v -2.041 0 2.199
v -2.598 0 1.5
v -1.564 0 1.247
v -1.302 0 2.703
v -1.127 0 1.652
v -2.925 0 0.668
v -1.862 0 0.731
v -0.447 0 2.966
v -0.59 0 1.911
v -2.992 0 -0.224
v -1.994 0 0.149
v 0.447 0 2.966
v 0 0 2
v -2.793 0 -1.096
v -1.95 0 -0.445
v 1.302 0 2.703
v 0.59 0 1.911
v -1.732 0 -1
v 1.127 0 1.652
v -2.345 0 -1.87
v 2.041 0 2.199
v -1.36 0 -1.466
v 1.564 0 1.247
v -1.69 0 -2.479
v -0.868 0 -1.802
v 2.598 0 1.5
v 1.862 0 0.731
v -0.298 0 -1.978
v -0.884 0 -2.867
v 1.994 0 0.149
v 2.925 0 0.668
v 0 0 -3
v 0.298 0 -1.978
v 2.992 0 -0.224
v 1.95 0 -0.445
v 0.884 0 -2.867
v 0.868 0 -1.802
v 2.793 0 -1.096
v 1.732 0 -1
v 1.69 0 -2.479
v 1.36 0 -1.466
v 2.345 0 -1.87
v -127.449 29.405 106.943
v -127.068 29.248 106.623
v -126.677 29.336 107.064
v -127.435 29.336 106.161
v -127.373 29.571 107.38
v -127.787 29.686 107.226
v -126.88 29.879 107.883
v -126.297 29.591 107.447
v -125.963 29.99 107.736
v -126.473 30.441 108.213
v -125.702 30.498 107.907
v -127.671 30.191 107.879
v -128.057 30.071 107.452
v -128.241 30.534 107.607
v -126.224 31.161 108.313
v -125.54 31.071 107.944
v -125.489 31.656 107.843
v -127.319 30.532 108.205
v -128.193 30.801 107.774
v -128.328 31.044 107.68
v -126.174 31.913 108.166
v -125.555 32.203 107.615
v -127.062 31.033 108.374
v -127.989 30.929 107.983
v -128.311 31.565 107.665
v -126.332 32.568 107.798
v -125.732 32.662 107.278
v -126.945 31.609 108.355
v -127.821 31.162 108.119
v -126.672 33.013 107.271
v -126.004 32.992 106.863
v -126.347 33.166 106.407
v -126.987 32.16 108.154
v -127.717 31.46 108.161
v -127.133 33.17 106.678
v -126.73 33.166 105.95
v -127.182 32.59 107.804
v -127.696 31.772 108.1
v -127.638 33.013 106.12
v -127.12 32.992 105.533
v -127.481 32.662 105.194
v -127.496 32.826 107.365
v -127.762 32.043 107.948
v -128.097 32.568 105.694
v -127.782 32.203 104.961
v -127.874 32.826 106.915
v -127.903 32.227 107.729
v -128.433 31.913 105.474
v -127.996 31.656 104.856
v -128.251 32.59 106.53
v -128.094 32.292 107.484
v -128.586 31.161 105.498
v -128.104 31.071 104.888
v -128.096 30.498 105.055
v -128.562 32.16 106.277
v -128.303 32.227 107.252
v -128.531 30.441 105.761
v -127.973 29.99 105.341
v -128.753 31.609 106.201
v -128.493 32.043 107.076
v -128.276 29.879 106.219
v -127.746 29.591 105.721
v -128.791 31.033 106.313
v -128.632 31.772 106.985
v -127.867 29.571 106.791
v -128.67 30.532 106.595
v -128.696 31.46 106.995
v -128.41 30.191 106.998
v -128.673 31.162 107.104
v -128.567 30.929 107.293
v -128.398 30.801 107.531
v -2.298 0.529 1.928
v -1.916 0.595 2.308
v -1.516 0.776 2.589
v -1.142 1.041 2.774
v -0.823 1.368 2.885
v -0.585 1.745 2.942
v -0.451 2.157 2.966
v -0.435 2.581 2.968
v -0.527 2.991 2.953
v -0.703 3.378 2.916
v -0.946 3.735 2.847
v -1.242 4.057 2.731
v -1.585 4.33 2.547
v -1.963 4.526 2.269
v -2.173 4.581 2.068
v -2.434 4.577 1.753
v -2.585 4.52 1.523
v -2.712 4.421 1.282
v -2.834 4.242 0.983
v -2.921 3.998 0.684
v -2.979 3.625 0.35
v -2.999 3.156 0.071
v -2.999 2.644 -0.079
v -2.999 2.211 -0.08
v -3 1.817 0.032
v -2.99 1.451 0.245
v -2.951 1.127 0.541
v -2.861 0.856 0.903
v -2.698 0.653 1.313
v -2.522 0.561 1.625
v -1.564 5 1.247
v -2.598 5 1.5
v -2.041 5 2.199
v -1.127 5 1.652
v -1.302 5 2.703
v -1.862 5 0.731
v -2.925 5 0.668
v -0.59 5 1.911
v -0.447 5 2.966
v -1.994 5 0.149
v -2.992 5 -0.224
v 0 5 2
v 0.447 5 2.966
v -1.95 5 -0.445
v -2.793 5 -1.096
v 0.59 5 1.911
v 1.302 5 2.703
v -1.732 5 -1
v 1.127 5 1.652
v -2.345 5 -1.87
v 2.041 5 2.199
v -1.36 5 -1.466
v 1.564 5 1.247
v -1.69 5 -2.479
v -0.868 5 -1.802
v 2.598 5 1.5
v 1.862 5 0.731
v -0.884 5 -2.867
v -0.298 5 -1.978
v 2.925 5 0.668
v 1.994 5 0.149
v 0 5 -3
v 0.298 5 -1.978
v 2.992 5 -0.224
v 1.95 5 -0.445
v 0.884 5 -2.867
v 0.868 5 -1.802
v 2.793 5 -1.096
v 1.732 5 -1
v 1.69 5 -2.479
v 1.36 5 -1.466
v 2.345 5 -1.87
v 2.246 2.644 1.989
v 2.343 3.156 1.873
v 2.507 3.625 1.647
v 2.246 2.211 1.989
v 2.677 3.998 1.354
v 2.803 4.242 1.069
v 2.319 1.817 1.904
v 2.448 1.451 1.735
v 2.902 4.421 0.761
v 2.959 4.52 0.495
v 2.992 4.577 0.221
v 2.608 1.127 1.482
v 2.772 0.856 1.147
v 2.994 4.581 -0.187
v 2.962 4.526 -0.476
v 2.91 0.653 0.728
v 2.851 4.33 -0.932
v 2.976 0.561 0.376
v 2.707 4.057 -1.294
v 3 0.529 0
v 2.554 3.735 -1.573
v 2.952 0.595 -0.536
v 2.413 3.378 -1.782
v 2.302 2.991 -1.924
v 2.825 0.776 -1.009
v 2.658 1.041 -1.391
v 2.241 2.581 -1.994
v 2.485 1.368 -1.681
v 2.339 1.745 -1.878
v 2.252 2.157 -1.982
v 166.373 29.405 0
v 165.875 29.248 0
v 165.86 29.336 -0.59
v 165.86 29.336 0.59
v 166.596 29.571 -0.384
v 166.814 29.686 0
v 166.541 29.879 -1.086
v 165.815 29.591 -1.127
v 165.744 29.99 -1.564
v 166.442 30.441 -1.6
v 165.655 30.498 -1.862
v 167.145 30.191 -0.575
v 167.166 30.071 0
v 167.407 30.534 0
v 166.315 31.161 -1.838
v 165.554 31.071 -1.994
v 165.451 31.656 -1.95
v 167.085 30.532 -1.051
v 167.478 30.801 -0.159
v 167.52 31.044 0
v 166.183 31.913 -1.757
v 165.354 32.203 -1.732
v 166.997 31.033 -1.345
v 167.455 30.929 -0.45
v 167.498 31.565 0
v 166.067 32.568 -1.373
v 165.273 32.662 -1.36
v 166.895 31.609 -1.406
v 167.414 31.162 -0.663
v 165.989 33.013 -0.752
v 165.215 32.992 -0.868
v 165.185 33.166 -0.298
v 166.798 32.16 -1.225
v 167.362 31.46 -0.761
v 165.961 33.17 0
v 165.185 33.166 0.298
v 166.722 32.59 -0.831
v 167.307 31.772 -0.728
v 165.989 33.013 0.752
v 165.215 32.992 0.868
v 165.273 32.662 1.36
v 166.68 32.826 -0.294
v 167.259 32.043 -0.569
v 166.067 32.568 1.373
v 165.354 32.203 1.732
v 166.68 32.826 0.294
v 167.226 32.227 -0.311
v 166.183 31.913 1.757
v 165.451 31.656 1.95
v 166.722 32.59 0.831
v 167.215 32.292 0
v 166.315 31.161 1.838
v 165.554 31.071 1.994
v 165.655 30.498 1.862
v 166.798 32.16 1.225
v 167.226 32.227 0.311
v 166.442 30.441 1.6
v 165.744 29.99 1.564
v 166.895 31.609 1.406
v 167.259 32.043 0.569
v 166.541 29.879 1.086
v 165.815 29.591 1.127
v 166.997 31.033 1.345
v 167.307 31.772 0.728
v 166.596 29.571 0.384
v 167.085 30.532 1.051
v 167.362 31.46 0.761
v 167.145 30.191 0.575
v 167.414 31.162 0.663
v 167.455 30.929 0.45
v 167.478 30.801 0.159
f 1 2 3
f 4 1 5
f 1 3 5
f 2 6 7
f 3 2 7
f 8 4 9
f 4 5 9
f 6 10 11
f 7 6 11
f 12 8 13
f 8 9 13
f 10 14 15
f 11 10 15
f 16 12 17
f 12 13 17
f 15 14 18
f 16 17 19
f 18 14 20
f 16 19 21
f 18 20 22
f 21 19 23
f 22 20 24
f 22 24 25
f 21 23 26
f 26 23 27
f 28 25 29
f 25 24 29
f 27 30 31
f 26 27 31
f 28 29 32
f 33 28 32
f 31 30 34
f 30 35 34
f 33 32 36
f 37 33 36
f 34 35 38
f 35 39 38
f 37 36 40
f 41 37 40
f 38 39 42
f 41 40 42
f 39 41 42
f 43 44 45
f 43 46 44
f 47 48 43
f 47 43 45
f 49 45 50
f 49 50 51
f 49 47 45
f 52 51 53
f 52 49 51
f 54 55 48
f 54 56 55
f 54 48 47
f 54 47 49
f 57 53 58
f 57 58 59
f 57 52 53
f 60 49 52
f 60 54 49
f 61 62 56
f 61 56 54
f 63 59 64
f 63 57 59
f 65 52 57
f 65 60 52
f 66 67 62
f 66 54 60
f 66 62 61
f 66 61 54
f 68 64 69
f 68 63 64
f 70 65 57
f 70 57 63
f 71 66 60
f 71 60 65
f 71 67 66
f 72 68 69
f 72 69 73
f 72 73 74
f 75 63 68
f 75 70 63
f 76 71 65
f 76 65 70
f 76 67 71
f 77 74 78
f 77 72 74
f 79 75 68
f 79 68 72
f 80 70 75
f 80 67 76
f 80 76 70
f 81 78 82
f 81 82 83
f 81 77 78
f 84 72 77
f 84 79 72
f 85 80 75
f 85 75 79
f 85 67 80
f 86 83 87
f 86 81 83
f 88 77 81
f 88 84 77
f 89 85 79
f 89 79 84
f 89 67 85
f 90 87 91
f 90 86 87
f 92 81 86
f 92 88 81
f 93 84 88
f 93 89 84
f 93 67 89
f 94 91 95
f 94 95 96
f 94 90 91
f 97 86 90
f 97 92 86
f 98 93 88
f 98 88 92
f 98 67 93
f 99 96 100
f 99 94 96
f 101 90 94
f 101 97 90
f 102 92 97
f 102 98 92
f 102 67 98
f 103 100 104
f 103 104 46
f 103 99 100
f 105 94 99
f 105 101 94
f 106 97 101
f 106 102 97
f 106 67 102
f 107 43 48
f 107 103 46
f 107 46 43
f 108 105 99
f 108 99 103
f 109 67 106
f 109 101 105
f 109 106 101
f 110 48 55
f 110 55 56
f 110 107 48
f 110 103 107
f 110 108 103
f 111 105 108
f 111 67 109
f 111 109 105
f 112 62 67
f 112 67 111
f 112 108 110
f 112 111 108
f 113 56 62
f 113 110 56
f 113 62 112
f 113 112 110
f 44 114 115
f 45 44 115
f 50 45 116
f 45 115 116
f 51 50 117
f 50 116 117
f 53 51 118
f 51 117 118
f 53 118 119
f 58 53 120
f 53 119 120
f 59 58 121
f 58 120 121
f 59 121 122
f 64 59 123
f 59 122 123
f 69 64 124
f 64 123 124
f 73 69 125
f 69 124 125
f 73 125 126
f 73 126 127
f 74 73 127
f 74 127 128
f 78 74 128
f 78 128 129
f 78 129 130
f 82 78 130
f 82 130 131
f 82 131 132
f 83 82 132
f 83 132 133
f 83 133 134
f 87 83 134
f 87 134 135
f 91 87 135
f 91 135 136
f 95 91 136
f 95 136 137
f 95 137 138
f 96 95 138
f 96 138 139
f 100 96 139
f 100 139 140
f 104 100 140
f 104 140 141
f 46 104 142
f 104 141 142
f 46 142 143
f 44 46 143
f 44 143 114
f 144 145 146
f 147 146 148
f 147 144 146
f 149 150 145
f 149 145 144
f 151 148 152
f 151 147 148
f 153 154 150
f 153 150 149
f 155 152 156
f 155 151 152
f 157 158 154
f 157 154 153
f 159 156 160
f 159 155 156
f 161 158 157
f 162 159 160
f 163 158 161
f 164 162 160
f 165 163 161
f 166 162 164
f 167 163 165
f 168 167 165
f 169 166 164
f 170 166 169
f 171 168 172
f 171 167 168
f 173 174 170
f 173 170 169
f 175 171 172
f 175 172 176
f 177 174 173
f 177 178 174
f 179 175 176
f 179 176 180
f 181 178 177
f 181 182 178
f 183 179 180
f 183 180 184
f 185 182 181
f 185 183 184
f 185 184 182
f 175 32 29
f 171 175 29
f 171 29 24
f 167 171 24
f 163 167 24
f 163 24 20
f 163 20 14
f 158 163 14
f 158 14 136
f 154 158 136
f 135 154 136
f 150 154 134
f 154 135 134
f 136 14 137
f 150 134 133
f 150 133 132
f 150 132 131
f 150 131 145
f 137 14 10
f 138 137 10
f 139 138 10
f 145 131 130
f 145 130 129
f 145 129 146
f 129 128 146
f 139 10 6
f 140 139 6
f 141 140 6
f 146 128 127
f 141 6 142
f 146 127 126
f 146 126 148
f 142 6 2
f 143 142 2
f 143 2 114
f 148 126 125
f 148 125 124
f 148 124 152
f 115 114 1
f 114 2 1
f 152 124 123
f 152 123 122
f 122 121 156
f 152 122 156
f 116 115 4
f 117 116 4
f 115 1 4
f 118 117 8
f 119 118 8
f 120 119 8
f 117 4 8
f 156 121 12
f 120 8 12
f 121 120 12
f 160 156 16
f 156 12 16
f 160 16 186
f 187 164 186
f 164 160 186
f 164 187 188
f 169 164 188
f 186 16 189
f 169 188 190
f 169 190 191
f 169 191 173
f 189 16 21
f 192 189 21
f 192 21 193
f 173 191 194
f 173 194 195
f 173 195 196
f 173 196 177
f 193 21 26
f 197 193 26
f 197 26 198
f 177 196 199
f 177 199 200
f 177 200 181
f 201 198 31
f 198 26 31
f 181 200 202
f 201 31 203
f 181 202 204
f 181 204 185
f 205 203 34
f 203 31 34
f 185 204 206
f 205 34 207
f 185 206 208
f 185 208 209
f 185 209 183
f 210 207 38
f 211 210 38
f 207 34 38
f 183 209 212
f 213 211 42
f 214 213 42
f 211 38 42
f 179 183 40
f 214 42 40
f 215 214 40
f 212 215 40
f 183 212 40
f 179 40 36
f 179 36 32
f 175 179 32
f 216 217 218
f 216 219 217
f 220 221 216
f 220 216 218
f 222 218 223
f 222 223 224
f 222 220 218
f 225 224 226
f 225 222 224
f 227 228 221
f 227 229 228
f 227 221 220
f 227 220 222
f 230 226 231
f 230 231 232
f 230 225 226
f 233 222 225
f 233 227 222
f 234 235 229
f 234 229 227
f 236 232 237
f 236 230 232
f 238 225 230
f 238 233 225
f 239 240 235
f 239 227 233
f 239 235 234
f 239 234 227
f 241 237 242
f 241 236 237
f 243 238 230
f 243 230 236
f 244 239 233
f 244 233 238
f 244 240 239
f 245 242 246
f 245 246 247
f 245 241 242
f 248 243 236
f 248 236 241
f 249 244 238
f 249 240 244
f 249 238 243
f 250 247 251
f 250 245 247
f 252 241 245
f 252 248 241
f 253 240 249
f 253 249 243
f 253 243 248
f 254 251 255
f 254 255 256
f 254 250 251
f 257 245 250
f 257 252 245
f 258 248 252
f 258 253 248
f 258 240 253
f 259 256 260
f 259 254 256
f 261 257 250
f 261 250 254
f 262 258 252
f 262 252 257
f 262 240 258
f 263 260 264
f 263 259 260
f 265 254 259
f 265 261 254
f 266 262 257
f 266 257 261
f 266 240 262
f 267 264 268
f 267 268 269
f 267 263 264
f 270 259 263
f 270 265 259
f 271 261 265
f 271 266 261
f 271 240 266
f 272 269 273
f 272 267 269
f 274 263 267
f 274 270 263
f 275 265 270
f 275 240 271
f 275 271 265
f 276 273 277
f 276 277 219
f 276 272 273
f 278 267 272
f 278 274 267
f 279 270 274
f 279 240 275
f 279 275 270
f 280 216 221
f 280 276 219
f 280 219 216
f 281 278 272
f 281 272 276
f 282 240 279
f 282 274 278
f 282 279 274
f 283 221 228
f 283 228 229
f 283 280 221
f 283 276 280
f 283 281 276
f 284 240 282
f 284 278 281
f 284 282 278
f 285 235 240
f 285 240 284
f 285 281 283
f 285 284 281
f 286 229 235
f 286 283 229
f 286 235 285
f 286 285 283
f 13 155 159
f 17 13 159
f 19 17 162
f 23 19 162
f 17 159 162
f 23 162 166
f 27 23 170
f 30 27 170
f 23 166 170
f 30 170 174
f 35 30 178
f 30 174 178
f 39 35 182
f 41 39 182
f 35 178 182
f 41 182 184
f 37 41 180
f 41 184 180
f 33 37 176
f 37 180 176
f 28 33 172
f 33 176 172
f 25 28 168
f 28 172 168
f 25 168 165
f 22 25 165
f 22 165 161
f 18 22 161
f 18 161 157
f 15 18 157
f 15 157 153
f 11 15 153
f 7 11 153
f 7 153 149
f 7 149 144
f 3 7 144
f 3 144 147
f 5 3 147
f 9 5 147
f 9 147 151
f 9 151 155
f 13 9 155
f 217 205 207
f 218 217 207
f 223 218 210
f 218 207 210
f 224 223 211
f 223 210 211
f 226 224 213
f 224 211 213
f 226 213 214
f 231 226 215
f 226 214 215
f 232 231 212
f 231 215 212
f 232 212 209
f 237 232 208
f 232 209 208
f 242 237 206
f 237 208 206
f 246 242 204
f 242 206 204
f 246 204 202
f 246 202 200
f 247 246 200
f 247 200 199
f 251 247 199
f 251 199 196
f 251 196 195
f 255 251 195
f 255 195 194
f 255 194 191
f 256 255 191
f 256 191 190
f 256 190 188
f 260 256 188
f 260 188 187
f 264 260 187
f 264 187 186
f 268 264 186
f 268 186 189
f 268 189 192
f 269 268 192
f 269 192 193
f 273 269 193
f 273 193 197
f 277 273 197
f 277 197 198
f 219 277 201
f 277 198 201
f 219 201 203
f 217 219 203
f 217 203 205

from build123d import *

# Parameters (mm, degrees)
BOSS_EXTRU_6_DEPTH                 = 5
ESQUISSE4_R                        = 2
BOSS_EXTRU_5_DEPTH                 = 170
CONG_3_R                           = 2
R_P_TITION_CIRCULAIRE1_COUNT       = 2
R_P_TITION_CIRCULAIRE1_ANGLE       = 140
CONG_3_OF_R_P_TITION_CIRCULAIRE1_R = 2
ESQUISSE6_R                        = 2
ENL_V_MAT_EXTRU_2_DEPTH            = 202.524852693


with BuildPart() as part:
    # Esquisse1 → Boss.-Extru.6 (new body)
    with BuildSketch(Plane(origin=(0, 0, 0), x_dir=(1, 0, 0), z_dir=(0, 1, 0))):
        with BuildLine():
            ThreePointArc((0, -3), (3, 0), (0, 3))
            ThreePointArc((0, 3), (-3, 0), (0, -3))
        make_face()
    extrude(amount=BOSS_EXTRU_6_DEPTH)

    # Esquisse4 → Boss.-Extru.5 (add)
    with BuildSketch(Plane(origin=(0.427525179, 0.075384224, 0), x_dir=(0, 0, -1), z_dir=(0.984807753012208, 0.17364817766693072, 0))):
        with Locations(Location((0, 2, 0), (0, 0, 270))):
            Circle(ESQUISSE4_R)
    boss_extru_5 = extrude(amount=BOSS_EXTRU_5_DEPTH)

    # Congé3
    cong_3_edges = [part.edges().sort_by_distance(p)[0] for p in [
        (167.150250481, 33.534805439, 0),
    ]]
    fillet(cong_3_edges, radius=CONG_3_R)

    # Répétition circulaire1: Boss.-Extru.5 ×2 about axis
    r_p_tition_circulaire1_axis = Axis((0, 0, 0), (0, -1, 0))
    for i in range(1, R_P_TITION_CIRCULAIRE1_COUNT):
        add(boss_extru_5.rotate(r_p_tition_circulaire1_axis, i * R_P_TITION_CIRCULAIRE1_ANGLE / (R_P_TITION_CIRCULAIRE1_COUNT - 1)))

    # Congé3 of Répétition circulaire1
    cong_3_of_r_p_tition_circulaire1_edges = [part.edges().sort_by_distance(p)[0] for p in [
        (-128.044520547, 33.534805439, 107.442109965),
    ]]
    fillet(cong_3_of_r_p_tition_circulaire1_edges, radius=CONG_3_OF_R_P_TITION_CIRCULAIRE1_R)

    # Esquisse6 → Enlèv. mat.-Extru.2 (cut, through all)
    with BuildSketch(Plane(origin=(0, 5, 0), x_dir=(1, 0, 0), z_dir=(0, 1, 0))):
        with Locations(Location((0, 0, 0), (0, 0, 270))):
            Circle(ESQUISSE6_R)
    extrude(amount=-ENL_V_MAT_EXTRU_2_DEPTH, mode=Mode.SUBTRACT)


solid = part.part
